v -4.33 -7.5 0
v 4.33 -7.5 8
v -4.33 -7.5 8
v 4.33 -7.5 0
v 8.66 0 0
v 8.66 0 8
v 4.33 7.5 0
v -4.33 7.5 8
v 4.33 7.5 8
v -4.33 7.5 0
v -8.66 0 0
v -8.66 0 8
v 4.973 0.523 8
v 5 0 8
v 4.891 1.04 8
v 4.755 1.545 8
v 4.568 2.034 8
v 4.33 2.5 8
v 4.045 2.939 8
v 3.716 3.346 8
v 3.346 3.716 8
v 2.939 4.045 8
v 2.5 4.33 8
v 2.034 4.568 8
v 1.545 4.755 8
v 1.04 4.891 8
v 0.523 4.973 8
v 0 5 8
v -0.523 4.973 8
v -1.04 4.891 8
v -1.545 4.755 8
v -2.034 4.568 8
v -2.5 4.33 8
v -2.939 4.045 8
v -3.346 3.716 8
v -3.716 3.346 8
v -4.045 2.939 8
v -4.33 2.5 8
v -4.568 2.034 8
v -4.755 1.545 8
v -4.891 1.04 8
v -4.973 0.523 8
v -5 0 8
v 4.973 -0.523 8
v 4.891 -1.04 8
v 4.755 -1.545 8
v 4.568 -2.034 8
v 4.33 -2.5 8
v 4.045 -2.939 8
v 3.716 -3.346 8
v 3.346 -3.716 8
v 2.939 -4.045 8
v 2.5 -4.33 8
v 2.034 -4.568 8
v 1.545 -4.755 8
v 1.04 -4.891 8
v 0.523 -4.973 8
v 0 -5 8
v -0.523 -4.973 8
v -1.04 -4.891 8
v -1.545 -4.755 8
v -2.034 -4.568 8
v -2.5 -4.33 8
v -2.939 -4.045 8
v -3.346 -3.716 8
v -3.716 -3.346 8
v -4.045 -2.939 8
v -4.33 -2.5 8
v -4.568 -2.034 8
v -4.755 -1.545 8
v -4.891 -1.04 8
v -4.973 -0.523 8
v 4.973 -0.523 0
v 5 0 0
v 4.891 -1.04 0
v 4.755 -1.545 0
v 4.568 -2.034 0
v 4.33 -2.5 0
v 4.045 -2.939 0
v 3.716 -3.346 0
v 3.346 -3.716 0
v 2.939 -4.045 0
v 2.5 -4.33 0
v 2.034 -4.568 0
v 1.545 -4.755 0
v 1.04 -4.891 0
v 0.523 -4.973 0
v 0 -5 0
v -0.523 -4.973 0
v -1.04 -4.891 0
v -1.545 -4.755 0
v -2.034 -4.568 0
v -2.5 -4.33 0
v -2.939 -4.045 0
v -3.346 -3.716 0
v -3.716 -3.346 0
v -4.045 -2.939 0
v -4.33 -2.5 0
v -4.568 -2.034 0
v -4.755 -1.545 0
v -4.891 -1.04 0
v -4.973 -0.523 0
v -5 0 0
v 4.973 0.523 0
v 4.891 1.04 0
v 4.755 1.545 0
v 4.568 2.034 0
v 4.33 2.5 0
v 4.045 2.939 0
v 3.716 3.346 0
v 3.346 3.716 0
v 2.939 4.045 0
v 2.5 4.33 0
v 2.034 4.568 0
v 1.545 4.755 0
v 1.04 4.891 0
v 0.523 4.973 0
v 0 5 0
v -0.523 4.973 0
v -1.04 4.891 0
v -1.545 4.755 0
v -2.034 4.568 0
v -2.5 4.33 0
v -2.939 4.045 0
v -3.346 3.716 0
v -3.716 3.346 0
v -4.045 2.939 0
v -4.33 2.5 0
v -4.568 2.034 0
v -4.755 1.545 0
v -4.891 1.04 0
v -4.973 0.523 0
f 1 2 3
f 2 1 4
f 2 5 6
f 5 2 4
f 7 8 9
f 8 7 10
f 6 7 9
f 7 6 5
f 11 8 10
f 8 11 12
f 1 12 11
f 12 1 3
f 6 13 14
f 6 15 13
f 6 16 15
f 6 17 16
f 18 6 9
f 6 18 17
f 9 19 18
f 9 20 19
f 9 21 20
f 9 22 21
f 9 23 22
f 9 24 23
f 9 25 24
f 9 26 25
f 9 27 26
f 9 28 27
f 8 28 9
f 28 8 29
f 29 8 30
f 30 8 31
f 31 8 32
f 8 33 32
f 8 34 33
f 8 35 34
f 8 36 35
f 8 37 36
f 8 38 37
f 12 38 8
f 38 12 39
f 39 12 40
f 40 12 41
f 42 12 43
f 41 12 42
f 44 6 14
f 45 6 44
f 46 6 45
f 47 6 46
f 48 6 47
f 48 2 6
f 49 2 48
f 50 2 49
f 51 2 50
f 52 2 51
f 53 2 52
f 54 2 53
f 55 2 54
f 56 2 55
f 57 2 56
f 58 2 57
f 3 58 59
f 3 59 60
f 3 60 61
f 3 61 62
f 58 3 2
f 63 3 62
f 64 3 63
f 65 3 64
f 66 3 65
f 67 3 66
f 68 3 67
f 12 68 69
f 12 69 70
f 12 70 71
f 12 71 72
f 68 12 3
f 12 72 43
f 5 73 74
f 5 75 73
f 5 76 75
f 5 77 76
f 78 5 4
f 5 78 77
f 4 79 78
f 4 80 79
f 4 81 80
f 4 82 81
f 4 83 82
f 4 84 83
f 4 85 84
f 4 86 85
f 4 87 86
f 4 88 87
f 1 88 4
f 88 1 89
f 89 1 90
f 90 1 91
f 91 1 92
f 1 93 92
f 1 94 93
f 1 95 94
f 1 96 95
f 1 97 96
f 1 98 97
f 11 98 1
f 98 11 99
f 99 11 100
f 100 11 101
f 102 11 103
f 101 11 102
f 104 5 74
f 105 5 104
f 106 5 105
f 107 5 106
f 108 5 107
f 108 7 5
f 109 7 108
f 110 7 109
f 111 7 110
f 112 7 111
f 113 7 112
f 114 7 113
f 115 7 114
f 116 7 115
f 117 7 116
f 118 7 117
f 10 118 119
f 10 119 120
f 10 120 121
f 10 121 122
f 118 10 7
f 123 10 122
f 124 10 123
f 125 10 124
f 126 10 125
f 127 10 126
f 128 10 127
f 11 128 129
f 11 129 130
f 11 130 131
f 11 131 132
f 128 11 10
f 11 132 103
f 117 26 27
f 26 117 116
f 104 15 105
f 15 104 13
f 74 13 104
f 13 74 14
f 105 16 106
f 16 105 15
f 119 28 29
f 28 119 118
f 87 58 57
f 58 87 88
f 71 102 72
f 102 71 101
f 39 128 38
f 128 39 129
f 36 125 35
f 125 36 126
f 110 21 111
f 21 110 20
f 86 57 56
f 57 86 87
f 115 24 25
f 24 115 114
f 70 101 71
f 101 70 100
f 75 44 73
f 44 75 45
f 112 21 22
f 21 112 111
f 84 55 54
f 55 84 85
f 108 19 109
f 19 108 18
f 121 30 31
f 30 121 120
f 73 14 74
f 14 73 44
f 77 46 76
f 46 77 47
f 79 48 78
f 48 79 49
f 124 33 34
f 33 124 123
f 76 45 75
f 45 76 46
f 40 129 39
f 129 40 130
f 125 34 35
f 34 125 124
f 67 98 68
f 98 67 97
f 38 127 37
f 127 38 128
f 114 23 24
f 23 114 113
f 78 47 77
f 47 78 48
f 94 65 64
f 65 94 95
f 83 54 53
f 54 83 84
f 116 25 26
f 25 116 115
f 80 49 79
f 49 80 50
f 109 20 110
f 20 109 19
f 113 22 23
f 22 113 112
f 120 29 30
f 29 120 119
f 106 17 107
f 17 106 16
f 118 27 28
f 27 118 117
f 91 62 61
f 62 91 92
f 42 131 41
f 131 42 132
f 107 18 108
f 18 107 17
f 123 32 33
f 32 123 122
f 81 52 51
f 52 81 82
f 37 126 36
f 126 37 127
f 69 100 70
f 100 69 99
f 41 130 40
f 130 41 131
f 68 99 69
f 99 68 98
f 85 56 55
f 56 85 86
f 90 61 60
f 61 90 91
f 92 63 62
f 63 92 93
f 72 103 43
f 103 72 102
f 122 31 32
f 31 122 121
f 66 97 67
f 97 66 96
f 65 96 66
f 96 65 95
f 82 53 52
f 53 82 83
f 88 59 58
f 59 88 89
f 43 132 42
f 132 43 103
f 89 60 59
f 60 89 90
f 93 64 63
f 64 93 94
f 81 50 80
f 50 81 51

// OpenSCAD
$fn = 60;

module hex_nut_m10() {
    // M10 hexagonal nut dimensions
    // Across flats (width): 15mm
    // Height: 8mm
    // Hole diameter: 10mm
    
    difference() {
        // Outer hexagon
        cylinder(h = 8, r = 15/2/cos(30), $fn = 6);
        
        // Inner hole
        cylinder(h = 8, r = 5, $fn = 60);
    }
}

hex_nut_m10();
